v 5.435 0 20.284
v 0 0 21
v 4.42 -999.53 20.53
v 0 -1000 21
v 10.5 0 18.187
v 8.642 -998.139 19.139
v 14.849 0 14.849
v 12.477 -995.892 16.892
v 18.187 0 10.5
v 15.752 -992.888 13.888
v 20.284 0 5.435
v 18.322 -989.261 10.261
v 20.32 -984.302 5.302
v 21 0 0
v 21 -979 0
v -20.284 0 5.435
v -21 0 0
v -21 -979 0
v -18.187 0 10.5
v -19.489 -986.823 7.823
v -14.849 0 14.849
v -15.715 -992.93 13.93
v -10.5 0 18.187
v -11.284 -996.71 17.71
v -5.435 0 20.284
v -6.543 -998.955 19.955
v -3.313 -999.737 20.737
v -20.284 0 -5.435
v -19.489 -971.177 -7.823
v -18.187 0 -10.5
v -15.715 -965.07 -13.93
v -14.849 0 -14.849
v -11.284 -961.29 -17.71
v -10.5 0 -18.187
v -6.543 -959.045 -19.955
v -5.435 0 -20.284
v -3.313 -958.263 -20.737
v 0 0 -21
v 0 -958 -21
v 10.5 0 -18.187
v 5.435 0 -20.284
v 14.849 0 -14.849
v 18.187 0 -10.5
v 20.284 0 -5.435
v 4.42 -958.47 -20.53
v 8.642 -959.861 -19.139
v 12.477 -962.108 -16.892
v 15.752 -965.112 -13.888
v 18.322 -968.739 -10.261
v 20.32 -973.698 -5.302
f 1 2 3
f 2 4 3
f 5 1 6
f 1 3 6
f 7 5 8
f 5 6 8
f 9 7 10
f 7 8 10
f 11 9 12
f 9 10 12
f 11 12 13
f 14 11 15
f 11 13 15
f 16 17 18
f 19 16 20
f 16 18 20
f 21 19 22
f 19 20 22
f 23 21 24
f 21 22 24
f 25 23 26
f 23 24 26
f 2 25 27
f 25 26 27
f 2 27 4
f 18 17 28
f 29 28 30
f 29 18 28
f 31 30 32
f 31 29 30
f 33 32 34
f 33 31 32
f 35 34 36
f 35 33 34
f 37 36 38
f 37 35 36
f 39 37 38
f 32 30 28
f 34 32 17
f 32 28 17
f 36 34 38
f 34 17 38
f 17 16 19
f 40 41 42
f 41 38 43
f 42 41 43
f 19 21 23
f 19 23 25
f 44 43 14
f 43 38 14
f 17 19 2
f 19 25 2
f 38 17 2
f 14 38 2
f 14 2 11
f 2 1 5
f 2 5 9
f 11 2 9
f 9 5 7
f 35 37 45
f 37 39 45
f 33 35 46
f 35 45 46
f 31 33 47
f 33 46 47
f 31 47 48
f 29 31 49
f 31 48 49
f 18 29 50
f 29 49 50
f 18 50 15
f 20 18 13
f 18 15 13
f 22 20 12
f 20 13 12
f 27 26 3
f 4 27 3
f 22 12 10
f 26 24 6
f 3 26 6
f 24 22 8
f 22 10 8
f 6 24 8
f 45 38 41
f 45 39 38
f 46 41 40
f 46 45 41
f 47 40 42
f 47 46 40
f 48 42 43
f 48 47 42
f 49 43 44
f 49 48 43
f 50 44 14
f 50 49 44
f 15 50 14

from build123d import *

# Parameters (mm, degrees)
F0_W     = 42
F0_H     = 42
F1_DEPTH = 1000
F3_DEPTH = 100
F4_R     = 20.99999


# Not quite as in the source:
# - a fillet or chamfer is up to 0.001 mm smaller than in the source, because OpenCascade refuses the exact size


with BuildPart() as f1:
    # F0 (on Front) → F1 (new body)
    with BuildSketch(Plane.XZ):
        Rectangle(F0_W, F0_H)
    extrude(amount=F1_DEPTH)

    # F2 (on face) → F3 (cut)
    with BuildSketch(Plane.YZ.offset(21)):
        Polygon((-958, -21), (-1000, 21), (-1000, -21), align=None)
    extrude(amount=-F3_DEPTH, mode=Mode.SUBTRACT)

    # F4 (radius 21 in the source; OpenCascade refuses exactly that, so slightly less here)
    f4_edges = [f1.edges().sort_by_distance(p)[0] for p in [
        (21, -500, 21),
        (21, -479, -21),
        (-21, -479, -21),
        (-21, -500, 21),
    ]]
    fillet(f4_edges, radius=F4_R)


solid = f1.part
